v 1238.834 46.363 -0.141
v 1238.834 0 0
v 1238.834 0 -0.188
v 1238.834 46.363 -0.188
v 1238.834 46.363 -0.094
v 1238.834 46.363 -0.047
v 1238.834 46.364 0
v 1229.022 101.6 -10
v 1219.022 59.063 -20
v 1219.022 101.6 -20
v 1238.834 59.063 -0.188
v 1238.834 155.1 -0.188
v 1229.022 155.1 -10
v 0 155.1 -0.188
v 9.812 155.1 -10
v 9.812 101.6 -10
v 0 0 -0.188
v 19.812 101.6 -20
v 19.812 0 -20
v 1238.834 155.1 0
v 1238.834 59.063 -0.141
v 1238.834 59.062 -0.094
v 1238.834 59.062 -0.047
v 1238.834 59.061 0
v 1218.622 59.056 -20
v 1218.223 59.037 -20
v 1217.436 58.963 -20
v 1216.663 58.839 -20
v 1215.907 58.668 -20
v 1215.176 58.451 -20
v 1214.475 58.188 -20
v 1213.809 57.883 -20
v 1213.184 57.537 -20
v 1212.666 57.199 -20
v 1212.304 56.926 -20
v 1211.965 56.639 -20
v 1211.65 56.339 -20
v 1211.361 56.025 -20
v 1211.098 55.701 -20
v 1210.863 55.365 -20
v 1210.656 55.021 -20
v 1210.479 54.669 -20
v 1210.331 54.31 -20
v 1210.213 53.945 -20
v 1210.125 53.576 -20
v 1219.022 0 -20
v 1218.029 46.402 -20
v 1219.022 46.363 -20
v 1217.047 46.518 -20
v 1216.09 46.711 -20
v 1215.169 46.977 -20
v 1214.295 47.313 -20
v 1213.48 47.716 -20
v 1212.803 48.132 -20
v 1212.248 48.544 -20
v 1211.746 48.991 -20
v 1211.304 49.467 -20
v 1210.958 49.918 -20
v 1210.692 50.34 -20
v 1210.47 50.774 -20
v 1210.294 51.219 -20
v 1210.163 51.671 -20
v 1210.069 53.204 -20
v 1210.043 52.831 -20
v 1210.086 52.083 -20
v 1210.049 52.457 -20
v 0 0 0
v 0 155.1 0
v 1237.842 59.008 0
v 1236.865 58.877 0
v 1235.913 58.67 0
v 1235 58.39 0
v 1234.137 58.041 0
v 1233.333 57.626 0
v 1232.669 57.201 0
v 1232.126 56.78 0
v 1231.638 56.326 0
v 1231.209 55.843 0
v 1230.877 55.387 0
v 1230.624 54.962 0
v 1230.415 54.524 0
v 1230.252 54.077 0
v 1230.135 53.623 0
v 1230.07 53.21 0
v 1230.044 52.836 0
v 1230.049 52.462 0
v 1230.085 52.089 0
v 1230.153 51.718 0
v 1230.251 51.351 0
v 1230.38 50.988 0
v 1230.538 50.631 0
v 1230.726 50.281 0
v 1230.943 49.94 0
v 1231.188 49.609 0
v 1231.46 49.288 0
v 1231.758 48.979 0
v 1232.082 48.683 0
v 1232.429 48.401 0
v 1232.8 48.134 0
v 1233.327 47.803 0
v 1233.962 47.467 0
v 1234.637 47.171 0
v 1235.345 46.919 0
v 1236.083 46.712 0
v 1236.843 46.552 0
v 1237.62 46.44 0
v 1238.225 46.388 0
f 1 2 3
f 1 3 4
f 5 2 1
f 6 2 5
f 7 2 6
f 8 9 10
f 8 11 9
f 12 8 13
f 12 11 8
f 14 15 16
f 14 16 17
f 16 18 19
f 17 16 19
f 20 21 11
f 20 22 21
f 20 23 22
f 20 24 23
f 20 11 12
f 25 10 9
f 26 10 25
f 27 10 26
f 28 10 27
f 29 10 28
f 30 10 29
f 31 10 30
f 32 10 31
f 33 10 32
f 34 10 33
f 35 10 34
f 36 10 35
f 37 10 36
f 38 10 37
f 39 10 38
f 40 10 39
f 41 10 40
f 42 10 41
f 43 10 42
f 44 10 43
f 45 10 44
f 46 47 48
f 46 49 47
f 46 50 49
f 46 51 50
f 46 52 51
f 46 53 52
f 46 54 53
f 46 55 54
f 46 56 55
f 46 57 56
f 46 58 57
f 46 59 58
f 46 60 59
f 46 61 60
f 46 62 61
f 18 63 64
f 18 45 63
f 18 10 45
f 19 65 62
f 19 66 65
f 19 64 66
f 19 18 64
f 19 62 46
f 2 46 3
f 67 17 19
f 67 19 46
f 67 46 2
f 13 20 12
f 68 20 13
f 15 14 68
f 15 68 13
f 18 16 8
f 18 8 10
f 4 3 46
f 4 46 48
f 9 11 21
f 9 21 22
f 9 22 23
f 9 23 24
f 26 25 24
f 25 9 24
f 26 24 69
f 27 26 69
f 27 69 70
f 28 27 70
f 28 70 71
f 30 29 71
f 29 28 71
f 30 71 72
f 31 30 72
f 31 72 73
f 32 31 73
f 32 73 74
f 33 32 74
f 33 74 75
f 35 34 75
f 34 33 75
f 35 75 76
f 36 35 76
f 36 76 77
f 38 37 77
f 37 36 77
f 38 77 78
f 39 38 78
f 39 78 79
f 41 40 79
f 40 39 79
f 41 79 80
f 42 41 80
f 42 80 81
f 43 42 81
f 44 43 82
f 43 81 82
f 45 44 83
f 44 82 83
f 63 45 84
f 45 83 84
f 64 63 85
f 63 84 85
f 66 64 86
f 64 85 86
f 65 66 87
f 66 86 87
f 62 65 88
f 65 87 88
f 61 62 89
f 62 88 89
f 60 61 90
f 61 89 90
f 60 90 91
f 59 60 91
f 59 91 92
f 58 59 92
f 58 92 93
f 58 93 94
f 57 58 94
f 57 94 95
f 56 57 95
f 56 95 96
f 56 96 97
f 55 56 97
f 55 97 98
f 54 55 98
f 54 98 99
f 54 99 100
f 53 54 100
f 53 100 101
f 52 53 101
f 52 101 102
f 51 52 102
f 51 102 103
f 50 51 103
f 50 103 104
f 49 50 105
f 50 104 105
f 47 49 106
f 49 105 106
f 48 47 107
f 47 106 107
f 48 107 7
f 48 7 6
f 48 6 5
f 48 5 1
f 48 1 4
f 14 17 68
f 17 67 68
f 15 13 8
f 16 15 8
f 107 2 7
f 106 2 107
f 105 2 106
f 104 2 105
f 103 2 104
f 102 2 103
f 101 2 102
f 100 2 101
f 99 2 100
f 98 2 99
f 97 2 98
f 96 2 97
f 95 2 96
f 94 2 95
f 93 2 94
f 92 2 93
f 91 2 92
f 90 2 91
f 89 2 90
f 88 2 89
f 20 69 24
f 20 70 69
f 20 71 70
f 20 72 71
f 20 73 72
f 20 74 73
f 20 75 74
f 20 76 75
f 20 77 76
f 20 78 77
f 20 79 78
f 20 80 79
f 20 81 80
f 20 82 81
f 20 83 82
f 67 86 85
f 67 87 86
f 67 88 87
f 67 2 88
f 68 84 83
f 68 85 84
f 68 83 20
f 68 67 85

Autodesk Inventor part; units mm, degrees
ref_plane "YZ Plane" through (0, 0, 0) normal (1, 0, 0) x (0, 1, 0)
ref_plane "XZ Plane" through (0, 0, 0) normal (0, 1, 0) x (-1, 0, 0)
sketch "Sketch1" plane through (0, 0, 0) normal (1, 0, 0) x (0, 1, 0)
  line L0 (0, 0) -> (155.1, 0)
  line L1 (155.1, 0) -> (155.1, -10)
  line L2 (0, -20) -> (0, 0)
  line L3 (155.1, -10) -> (101.6, -10)
  line L4 (101.6, -10) -> (101.6, -20)
  line L5 (101.6, -20) -> (0, -20)
  dimension "d3" = 53.5
  dimension "d4" = 155.1
  dimension "d5" = 10
  dimension "d6" = 10
  dimension "d7" = 20
  dimension "d18" = 101.6
extrude "Extrusion1" add sketch "Sketch1" along normal blind 1238.8342
chamfer "Chamfer1" distance 19.812 angle 45 1 edges at (1238.8342, 50.8, -20)
chamfer "Chamfer2" distance 19.812 angle 45 1 edges at (0, 50.8, -20)
ref_plane "Work Plane2" through (1183.1012, 38.0112, -55.921) normal (-0.7071, 0, -0.7071) x (0, 1, 0)
sketch "Sketch3" plane through (1183.1012, 38.0112, -55.921) normal (-0.7071, 0, -0.7071) x (0, 1, 0)
  line L0 (117.0888, 0) -> (14.7014, 0)
  point P0 (-38.0112, -876.121)
  dimension "d21" = 102.3874
hole "Hole1" at (1183.1012, 52.7126, -55.921) direction (0.7071, 0, 0.7071) diameter 12.7 depth 127 tip angle 118
properties part number "SkinnySideLengthPower" material "Wood (Birch)"
